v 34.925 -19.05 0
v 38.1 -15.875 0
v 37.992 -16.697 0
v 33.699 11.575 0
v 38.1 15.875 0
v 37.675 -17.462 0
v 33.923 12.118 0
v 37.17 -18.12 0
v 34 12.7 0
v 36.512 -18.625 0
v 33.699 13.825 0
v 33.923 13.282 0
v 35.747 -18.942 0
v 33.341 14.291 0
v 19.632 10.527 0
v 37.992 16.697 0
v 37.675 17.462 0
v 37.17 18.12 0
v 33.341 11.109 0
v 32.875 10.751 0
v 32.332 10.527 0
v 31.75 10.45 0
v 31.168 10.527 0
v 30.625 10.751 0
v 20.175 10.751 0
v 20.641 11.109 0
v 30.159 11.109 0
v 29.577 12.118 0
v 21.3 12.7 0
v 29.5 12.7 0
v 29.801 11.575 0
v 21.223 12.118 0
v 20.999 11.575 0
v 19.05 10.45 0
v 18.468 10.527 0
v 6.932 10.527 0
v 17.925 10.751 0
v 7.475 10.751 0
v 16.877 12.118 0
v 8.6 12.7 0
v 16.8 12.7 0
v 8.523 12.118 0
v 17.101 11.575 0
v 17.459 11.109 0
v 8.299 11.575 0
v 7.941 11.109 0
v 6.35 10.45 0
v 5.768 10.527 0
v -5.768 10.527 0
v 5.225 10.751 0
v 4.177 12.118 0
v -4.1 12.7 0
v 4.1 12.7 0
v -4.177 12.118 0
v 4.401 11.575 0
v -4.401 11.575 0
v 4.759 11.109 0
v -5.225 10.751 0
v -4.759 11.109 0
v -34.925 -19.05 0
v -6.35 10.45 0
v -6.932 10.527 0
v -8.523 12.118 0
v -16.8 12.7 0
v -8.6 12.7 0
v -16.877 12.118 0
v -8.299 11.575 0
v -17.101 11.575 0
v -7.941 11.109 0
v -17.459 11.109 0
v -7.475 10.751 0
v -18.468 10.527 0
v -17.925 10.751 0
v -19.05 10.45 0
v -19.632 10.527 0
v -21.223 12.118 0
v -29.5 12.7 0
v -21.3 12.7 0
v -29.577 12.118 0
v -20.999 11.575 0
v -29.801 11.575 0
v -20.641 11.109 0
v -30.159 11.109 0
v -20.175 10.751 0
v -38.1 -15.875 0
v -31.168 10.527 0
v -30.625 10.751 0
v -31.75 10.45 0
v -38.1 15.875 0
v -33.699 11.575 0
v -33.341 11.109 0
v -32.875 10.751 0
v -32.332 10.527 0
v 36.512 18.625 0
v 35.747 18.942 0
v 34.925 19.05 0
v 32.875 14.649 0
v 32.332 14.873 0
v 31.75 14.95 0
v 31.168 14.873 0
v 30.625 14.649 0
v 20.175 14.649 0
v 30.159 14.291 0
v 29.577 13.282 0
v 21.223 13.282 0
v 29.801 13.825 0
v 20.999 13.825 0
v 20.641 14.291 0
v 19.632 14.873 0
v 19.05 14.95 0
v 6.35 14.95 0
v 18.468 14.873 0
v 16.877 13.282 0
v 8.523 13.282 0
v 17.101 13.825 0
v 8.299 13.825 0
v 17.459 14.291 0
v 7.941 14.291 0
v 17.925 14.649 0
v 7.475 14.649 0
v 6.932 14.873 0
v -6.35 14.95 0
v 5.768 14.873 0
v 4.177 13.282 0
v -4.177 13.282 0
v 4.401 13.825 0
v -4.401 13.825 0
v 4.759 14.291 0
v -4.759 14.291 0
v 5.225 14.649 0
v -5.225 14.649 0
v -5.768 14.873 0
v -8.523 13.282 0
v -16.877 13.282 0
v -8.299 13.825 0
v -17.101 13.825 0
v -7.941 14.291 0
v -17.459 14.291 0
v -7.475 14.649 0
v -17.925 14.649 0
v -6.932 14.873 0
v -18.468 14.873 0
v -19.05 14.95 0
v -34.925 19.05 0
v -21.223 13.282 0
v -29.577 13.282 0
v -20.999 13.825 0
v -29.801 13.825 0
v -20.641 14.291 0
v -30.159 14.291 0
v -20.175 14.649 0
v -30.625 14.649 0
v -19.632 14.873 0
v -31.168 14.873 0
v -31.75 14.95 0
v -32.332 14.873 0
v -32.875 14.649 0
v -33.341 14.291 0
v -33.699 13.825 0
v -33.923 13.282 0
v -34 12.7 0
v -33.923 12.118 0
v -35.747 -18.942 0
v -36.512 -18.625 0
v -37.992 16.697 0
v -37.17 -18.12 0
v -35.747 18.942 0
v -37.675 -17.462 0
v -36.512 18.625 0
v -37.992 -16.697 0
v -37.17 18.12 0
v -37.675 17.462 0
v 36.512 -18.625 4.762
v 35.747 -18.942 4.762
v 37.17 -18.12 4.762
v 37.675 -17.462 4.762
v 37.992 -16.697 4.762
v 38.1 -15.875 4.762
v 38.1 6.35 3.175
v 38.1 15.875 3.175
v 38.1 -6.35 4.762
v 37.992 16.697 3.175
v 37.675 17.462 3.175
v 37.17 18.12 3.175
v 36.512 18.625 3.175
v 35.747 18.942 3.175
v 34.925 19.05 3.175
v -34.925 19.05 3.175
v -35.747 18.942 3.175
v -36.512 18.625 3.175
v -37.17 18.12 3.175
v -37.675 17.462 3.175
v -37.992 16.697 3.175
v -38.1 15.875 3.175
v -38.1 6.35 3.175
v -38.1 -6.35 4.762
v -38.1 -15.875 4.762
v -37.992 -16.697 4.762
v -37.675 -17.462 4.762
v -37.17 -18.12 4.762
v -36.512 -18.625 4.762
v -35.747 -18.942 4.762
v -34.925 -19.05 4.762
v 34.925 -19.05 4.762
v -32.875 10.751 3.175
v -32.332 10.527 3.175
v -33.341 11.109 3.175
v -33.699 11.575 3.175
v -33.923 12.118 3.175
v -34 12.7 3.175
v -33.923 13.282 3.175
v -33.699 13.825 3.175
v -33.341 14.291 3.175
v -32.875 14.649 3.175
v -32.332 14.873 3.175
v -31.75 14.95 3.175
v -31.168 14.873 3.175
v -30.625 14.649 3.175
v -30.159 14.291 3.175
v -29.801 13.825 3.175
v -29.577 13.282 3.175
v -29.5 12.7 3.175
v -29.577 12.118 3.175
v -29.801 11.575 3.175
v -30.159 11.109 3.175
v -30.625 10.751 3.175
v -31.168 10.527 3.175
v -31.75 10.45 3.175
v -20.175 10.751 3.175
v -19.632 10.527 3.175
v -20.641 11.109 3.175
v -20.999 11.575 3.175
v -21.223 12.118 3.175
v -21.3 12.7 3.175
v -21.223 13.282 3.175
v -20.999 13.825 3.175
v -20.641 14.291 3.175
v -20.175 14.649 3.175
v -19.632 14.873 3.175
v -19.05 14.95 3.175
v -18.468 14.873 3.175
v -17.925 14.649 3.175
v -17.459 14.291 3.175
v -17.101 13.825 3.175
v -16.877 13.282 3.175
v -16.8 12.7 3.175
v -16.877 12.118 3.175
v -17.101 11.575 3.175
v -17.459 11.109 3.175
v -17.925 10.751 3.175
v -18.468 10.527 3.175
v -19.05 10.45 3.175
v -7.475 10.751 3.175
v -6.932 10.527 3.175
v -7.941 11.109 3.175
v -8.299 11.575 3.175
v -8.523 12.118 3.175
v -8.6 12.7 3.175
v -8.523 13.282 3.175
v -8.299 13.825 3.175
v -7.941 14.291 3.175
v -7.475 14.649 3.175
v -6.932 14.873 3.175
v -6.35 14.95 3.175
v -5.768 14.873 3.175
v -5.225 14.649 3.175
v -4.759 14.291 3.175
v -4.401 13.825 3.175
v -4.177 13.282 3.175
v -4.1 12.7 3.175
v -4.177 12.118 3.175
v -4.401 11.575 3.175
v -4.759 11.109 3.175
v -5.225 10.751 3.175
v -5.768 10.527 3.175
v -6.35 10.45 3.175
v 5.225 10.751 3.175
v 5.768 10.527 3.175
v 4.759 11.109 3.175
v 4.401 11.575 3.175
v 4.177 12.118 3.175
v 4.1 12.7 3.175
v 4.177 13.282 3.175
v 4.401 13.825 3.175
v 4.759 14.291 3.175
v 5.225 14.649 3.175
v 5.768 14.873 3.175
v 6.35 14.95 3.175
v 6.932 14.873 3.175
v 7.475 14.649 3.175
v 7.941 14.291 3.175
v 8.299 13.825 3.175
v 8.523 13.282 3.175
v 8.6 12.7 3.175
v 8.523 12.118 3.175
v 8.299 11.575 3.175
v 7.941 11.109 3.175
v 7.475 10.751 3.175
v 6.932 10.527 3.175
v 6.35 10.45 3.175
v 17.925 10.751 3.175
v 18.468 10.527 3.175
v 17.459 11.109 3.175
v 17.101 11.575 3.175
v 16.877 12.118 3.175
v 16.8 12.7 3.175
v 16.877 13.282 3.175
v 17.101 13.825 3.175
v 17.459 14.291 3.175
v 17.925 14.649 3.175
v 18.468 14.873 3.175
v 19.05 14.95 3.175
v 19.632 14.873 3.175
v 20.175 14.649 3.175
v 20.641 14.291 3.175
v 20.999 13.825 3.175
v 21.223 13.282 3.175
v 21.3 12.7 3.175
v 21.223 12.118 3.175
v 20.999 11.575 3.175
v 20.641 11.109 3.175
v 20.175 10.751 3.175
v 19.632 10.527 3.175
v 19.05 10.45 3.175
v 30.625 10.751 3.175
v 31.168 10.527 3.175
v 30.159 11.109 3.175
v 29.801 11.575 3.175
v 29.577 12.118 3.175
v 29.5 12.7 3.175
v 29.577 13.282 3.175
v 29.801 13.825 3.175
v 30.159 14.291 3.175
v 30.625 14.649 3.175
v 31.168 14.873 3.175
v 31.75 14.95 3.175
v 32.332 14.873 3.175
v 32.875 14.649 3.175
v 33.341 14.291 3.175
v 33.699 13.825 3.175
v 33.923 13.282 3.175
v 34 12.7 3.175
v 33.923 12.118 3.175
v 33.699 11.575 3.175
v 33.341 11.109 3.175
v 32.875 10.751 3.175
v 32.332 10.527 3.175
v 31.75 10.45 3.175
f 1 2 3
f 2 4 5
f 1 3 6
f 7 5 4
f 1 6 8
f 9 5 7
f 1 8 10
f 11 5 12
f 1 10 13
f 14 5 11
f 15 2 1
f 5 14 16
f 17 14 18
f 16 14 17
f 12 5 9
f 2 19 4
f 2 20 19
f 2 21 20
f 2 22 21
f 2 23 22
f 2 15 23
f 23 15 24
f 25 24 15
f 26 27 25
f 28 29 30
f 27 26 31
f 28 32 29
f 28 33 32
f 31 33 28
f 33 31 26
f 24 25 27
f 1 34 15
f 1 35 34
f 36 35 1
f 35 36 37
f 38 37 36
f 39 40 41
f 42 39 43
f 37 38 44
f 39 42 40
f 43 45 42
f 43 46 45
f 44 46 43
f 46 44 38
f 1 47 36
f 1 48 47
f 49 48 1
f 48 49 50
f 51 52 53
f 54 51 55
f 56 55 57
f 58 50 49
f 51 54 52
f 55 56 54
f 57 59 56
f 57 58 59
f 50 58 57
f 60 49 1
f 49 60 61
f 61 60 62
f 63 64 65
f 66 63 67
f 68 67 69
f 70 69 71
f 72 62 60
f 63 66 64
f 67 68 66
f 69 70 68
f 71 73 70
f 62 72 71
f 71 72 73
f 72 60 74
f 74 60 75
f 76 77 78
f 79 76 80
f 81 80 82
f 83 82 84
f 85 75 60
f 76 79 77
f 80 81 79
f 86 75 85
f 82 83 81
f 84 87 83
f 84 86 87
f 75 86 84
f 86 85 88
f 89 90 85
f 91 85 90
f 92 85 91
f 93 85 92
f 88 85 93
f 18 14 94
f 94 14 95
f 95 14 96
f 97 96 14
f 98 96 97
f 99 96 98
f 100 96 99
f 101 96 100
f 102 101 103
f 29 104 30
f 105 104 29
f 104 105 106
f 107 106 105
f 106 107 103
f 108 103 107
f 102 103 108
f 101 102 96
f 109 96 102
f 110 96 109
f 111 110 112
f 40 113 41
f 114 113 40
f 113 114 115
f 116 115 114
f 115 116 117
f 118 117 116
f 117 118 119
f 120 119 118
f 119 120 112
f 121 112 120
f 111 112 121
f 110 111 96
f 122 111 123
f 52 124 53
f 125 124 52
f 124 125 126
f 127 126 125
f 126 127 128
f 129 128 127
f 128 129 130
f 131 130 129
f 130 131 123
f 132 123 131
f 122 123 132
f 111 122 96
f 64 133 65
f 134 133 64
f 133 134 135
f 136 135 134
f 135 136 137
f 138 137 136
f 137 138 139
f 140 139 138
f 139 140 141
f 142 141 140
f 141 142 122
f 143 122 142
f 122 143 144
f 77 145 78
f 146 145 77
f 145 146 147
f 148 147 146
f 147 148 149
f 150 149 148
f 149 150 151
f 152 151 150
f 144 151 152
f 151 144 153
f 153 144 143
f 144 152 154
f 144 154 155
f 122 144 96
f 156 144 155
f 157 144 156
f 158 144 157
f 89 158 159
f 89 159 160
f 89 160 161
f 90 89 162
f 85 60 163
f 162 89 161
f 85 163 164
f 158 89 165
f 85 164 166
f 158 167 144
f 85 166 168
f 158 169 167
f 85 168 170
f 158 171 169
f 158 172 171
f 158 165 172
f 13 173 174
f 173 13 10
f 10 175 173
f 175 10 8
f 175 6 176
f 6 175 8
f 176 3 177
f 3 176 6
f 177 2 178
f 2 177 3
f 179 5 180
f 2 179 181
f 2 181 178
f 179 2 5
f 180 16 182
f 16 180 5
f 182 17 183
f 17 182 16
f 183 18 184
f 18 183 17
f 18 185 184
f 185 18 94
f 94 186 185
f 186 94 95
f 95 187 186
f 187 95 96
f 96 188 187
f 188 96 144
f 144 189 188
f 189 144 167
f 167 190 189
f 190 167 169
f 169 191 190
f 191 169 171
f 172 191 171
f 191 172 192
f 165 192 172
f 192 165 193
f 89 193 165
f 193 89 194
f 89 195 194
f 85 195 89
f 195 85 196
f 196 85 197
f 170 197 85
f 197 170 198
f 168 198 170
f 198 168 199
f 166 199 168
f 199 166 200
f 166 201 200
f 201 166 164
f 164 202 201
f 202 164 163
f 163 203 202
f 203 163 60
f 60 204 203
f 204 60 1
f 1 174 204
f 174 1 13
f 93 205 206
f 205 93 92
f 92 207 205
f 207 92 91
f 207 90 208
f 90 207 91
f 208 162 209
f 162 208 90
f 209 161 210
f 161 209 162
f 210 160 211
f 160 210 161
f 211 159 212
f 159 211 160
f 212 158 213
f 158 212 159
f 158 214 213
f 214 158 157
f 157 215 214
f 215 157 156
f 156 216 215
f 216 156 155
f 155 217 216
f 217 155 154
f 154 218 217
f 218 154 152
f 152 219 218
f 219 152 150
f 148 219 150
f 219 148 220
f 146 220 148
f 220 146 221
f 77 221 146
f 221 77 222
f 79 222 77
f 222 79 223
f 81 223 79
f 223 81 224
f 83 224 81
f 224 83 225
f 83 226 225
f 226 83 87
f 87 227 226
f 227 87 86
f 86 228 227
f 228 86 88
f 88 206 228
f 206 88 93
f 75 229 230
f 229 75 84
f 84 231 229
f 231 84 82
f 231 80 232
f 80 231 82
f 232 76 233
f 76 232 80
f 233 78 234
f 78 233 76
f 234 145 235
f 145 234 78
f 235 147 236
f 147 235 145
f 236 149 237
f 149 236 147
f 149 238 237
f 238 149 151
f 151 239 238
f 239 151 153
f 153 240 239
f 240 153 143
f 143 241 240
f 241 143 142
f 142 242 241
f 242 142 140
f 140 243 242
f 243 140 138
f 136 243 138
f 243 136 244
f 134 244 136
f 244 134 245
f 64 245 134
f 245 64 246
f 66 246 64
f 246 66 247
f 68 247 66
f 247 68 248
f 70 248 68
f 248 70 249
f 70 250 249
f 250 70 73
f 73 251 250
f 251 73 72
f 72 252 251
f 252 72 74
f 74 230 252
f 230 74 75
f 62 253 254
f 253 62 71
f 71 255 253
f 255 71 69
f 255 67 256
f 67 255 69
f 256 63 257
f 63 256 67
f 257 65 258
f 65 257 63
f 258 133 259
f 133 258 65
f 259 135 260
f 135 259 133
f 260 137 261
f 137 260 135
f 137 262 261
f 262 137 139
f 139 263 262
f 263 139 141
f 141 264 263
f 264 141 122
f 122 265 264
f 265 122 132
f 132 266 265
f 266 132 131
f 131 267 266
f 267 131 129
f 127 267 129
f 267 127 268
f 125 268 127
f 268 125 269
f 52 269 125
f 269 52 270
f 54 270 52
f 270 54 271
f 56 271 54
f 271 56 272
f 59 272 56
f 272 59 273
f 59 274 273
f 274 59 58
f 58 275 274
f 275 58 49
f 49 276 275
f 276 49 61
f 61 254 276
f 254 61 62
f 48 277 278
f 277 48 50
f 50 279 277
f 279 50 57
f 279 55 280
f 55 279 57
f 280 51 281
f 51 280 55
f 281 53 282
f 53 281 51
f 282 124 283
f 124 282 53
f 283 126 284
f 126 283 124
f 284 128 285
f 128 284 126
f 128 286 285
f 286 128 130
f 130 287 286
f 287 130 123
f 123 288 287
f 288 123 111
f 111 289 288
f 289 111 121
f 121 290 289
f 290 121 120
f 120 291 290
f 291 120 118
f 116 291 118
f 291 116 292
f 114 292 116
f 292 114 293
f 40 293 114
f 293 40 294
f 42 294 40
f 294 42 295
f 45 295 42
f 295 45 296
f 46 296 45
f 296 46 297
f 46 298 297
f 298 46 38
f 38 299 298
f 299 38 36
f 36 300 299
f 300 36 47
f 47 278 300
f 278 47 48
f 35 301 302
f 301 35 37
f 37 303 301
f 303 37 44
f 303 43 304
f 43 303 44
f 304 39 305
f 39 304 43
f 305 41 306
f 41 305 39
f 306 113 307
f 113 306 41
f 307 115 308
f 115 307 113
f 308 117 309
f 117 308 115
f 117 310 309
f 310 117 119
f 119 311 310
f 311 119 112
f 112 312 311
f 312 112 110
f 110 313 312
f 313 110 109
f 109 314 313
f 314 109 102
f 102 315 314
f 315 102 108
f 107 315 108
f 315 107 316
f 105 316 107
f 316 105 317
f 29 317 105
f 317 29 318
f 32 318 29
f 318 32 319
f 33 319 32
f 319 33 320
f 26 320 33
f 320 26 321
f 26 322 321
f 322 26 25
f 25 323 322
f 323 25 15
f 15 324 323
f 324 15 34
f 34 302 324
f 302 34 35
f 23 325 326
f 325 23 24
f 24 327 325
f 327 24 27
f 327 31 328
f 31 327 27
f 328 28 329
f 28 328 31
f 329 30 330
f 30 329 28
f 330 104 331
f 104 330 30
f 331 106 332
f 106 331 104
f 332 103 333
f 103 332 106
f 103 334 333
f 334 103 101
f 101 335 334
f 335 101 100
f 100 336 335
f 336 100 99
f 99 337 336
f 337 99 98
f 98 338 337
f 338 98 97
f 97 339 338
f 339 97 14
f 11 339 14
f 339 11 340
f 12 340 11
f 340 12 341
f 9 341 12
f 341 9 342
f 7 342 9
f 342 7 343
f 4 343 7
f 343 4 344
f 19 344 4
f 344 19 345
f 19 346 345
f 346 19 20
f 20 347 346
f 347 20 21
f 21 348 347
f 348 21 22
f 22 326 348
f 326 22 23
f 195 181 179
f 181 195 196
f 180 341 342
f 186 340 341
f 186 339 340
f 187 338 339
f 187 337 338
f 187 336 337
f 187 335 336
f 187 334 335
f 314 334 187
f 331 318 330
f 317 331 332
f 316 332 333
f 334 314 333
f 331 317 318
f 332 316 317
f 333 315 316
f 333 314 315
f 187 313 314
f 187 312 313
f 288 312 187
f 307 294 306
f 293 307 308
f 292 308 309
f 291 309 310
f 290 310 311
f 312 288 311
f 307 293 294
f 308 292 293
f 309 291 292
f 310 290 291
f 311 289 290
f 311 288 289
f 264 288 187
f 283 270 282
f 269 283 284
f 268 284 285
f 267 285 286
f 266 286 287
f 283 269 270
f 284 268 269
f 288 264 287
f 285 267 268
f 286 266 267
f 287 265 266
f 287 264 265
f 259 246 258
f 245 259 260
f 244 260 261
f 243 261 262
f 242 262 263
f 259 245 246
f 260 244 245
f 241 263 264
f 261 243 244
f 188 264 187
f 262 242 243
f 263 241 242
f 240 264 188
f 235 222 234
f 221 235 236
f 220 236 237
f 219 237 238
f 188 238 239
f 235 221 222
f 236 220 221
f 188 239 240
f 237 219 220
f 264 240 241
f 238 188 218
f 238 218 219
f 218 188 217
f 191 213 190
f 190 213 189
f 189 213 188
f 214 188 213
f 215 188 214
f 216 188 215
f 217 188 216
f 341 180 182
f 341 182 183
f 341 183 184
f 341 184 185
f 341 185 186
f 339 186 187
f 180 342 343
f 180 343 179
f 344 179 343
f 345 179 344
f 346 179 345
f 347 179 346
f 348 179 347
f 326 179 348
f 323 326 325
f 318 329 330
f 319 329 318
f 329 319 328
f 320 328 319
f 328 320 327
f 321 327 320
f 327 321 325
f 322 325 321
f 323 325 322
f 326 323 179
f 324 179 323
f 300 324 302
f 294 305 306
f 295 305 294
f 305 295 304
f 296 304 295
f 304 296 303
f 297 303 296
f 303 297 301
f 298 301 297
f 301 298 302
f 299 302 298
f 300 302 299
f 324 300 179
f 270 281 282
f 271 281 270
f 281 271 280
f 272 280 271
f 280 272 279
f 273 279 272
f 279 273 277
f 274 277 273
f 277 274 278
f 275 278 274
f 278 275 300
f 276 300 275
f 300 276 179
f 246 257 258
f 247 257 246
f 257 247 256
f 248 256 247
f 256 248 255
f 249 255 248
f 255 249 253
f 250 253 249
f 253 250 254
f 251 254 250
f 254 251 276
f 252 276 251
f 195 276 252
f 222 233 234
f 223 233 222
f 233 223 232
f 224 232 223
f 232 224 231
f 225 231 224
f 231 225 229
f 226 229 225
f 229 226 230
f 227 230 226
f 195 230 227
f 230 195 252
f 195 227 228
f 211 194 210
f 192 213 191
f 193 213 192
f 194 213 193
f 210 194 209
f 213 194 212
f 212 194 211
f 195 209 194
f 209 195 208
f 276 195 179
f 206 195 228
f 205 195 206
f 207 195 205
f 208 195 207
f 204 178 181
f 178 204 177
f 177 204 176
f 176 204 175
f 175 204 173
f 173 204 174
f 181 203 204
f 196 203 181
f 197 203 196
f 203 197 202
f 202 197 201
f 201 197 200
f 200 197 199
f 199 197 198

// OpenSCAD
// file: ../lib/TOGArrayLib1.scad
// TOGArrayLib1.4
// 
// Functions for working with arrays.
// 
// v1.1:
// - tal1_reduce assert(is_list(items)) to prevent infinite recursion
//   when given undefined or other non-list values
// v1.1.1:
// - Fix tal1_uniq_remap_v2 to return "list-remap-result" as the
//   first element of the returned list
// v1.2:
// - Add tal1_replace_at function
// v1.3:
// - tal1_is_vec_of, tal1_is_vec_of_num
// v1.4:
// - tal1_assert_for_each, for when you want to assert something
//   about each of a list of items and get nice failure messages

/**
 * Make a list with the contents of list `a`,
 * but starting at offset `off`, replaced by the contents of list `b`.
 * len(result) = max(len(a), off+len(b))
 */
function tal1_replace_at(a, off, b, default_value=undef, default_value_function=undef) =
	assert(is_list(a))
	assert(is_list(b))
	let( _dvf = !is_undef(default_value_function) ? default_value_function : function(i) default_value )
[
	for( i=[0:1:min(off,len(a))-1] ) a[i],
	for( i=[len(a):1:off-1] ) _dvf(i),
	for( i=[off:1:off+len(b)-1] ) b[i-off],
	for( i=[off+len(b):1:len(a)-1] ) a[i],
];

// Simplest case
assert([] == tal1_replace_at([], 0, []));
// Second simplest cases
assert(["foo"] == tal1_replace_at(["foo"], 0, []));
assert(["foo"] == tal1_replace_at([], 0, ["foo"]));
// Replace one item
assert(["foo","quux","baz"] == tal1_replace_at(["foo","bar","baz"], 1, ["quux"]));
// Replace and extend
assert(["foo","quux","tuna","tina"] == tal1_replace_at(["foo","bar","baz"], 1, ["quux", "tuna", "tina"]));
// Add beyond end of `a`
assert(["foo","zzz","quux"] == tal1_replace_at(["foo"], 2, ["quux"], default_value="zzz"));
// Adding 'nothing' should still fill to that point with defaults
assert(["foo","zzz","zzz"] == tal1_replace_at(["foo"], 3, [], default_value="zzz"));


function tal1_reduce(start, items, func, offset=0) =
	assert(is_list(items))
	len(items) == offset ? start :
	tal1_reduce(func(start, items[offset]), items, func, offset+1);

function tal1_consecutive_duplicate_count(items) = tal1_reduce(
	[0, undef],
	items,
	function(z,item) [z[0] + (item == z[1] ? 1 : 0), item]
)[0];

assert(0 == tal1_consecutive_duplicate_count([]));
assert(0 == tal1_consecutive_duplicate_count([50]));
assert(1 == tal1_consecutive_duplicate_count([50,50]));
assert(0 == tal1_consecutive_duplicate_count([50,51,52,53]));
assert(1 == tal1_consecutive_duplicate_count([50,51,52,52]));
assert(3 == tal1_consecutive_duplicate_count([50,50,50,50]));

// Set test_size to arbirarily large values
// to ensure that OpenSCAD can handle heavy recursion
let(test_size=1000) assert(test_size/2 == tal1_consecutive_duplicate_count([for(i=[0:1:test_size-1]) floor(i/2)]));



function tal1_uniq_(items, off0, off1) =
	let(chunklen = off1-off0)
	chunklen == 0 ? [] :
	chunklen == 1 ? [items[off0]] :
	let(half=floor(chunklen/2))
	let(left  = tal1_uniq_(items, off0     , off0+half))
	let(right = tal1_uniq_(items, off0+half, off1     ))
	assert(len(left) > 0)
	assert(len(right) > 0)
	left[len(left)-1] == right[0] ? [each left, for(i=[1:1:len(right)-1]) right[i]] :
	[each left, each right];

/** Given a list of items, returns a new list with identical consecutive items merged */
function tal1_uniq(items) = tal1_uniq_(items, 0, len(items));

assert([] == tal1_uniq([]));
assert([123] == tal1_uniq([123]));
assert([55,0,1,2,3] == tal1_uniq([55,0,1,2,3]));
assert([55,0,1,2] == tal1_uniq([55,0,1,1,2]));
assert([55,0,1] == tal1_uniq([55,55,0,0,0,0,0,0,1,1,1,1]));
assert([55,0] == tal1_uniq([55,0,0,0,0,0,0,0]));



/**
 * Returns [new items, old index -> new index mapping].
 * No-op version.
 */
function tal1_uniq_remap_v1(items) =
	["list-remap-result", items, [for (vi=[0:1:len(items)-1]) vi]];

// [a, a, b, b, c, c]
//
// [a,    ...], []  -> [a],[0]
// [a, a, ...], [0] -> [a],[0,0]

assert([1,2,3] == [1,2,3]);

/**
 * Recursive version that will combine adjacent identical vertexes,
 * but will use the original items.
 */
function tal1_uniq_remap_v2(items, map=[]) =
	let(index = len(map))
	len(items) == index ? ["list-remap-result", items, map] :
	index == 0 ? tal1_uniq_remap_v2(items, [0]) :
	items[index] == items[map[index-1]] ? tal1_uniq_remap_v2(items, [for(vi=map) vi, map[index-1]]) :
	tal1_uniq_remap_v2(items, [for(vi=map) vi, index]);

assert(tal1_uniq_remap_v2([1,1,2,2,3,4]) == ["list-remap-result", [1,1,2,2,3,4], [0,0,2,2,4,5]]);


/**
 * Returns true if `vec` is a list of at least min_len items
 * and component_check(each item, even those beyond min_len) is true.
 */
function tal1_is_vec_of(vec, min_len=0, component_check=function(x) true) =
	assert(is_num(min_len) && min_len >= 0)
	assert(is_function(component_check))
	is_list(vec) && len(vec) >= min_len &&
	tal1_reduce(true, vec, function(prev,item) prev && component_check(item));

function tal1_is_vec_of_num(vec, min_len=0) = tal1_is_vec_of(vec, min_len, function(i) is_num(i));

assert( true == tal1_is_vec_of_num([1,2,3]));
assert( true == tal1_is_vec_of_num([]));
assert( true == tal1_is_vec_of_num([1,2,3], 3));
assert(false == tal1_is_vec_of_num([1,2], 3));
assert(false == tal1_is_vec_of_num([1,2,"spoon"], 3));
// Requirements are ambiguous when
// first min_len items are numbers, but there are non-numeric items afterwards,
// so let's error on the side of saying 'no, it's not a list of numbers';
// i.e. the item check and the min_len are independent.
assert(false == tal1_is_vec_of_num([1,2,3,"artichoke"], 3));


/**
 * Asserts that item_checker(each item in list, index of item)[0] is true.
 * Second element of item_checker return value is assertion message.
 * Returns the original list, in case that's useful to you.
 */
function tal1_assert_for_each(list, item_checker) =
	let( _ignored = [ for(i=[0:1:len(list)-1])
		let(q=item_checker(list[i],i))
		let(passed=is_bool(q) ? q : is_list(q) ? q[0] : assert(false, str(
			"tal1_assert_for_each: item_checker should return Bool|[Bool,String], but returned ",
			q, " for item at index ", i)))
		let(message=is_list(q) ? q[1] : undef)
		assert(passed, message)
		q
	])
	list;

// Callback can return a boolean...
assert([1,2,3] == tal1_assert_for_each([1,2,3], function(v,i) is_num(v)));
// ...or a [boolean, string]
assert([1,2,3] == tal1_assert_for_each([1,2,3], function(v,i) [is_num(v), "element be a num"]));
// file: ../lib/TOGMod1Constructors.scad
// TOGMod1Constructors-v1.6
// 
// Functions to construct objects understood by TOGMod1
// 
// v1.1:
// - Add togmod1_make_rounded_rect
// v1.2:
// - togmod1_make_rounded_rect can make ovals
// v1.3:
// - togmod1_circle_points, to just get the points of a circle
// - if pos parameter to circle function has a third element,
//   returned vertexes will include it as the z component;
// v1.3.1
// - Some assertions
// v1.4:
// - Refactor togmod1_rounded_rect_points and togmod1_circle_points
//   to use togmod1__make_nd_vector_adder for adapting to whatever
//   `pos` parameter is.
// v1.5:
// - togmod_rounded_rect_points will not simplify completely rounded sides
//   (where length of side is exactly twice the rounding radius)
//   unless simplify_rounded_sides=true
//   - This makes it more useful for polyhedron generation,
//     where radius varies, but number of points must remain constant.
// v1.6:
// - togmod1_make_rect makes a simple rectangle
// - togmod1_make_rounded_rect will defer to togmod1_make_rect when r=0

use <./TOGArrayLib1.scad>

function togmod1__make_nd_vector_adder(origin=[0,0]) =
	let(origin_is_zero = tal1_reduce(true, origin, function(prev,item) prev && item == 0))
	origin_is_zero ? (function(vec) len(vec) >= len(origin) ? vec : tal1_replace_at(origin, 0, vec)) :
	function(vec) [
		for(i=[0:1:max(len(origin),len(vec))-1]) (len(vec) > i ? vec[i] : 0) + (len(origin) > i ? origin[i] : 0),
	];

assert([1,2,3] == togmod1__make_nd_vector_adder()([1,2,3]));
echo(togmod1__make_nd_vector_adder([0,0,3])([1,2]));
assert([1,2,3] == togmod1__make_nd_vector_adder([0,0,3])([1,2]));


function togmod1_make_cuboid(size) =
	assert(is_list(size))
	assert(len(size) >= 3)
	assert(is_num(size[0]))
	assert(is_num(size[1]))
	assert(is_num(size[2]))
	["polyhedron-vf", [
		[-size[0]/2, -size[1]/2, -size[2]/2],
		[+size[0]/2, -size[1]/2, -size[2]/2],
		[-size[0]/2, +size[1]/2, -size[2]/2],
		[+size[0]/2, +size[1]/2, -size[2]/2],
		[-size[0]/2, -size[1]/2, +size[2]/2],
		[+size[0]/2, -size[1]/2, +size[2]/2],
		[-size[0]/2, +size[1]/2, +size[2]/2],
		[+size[0]/2, +size[1]/2, +size[2]/2]
	], [
		[0,1,3,2],[0,4,5,1],[4,6,7,5],[3,7,6,2],[1,5,7,3],[6,4,0,2]
	]];

function togmod1_make_polygon(verts) =
	["polygon-vp", verts, [[for( i=[0:1:len(verts)-1] ) i%len(verts)]]];

function togmod1_rounded_rect_points(size, r, pos=[0,0], simplify_rounded_sides=false) =
	assert(is_list(size))
	assert(len(size) >= 2)
	let(radii = is_list(r) ? r : is_num(r) ? [r,r] : assert(false, "rounded_rect r(adius) should be list<num> or num"))
	let(rx = radii[0])
	let(ry = radii[1])
	assert(is_num(rx))
	assert(is_num(ry))
	assert(size[0] >= 2*rx, str("size[0] must be >= 2*r[0]; size[0] = ",size[0],", 2*r[0] = ",2*rx))
	assert(size[1] >= 2*ry, str("size[1] must be >= 2*r[1]; size[1] = ",size[1],", 2*r[1] = ",2*ry))
	let(quarterfn=max($fn/4, 1))
	let(qfnx = simplify_rounded_sides && size[0] == 2*rx ? quarterfn-1 : quarterfn)
	let(qfny = simplify_rounded_sides && size[1] == 2*ry ? quarterfn-1 : quarterfn)
	let(finalizepos = togmod1__make_nd_vector_adder(pos))
[
	for(a=[0 : 1 : qfnx]) let(ang=      a*90/quarterfn) finalizepos([ size[0]/2-rx + rx*cos(ang),  size[1]/2-ry + ry*sin(ang)]),
	for(a=[0 : 1 : qfny]) let(ang= 90 + a*90/quarterfn) finalizepos([-size[0]/2+rx + rx*cos(ang),  size[1]/2-ry + ry*sin(ang)]),
	for(a=[0 : 1 : qfnx]) let(ang=180 + a*90/quarterfn) finalizepos([-size[0]/2+rx + rx*cos(ang), -size[1]/2+ry + ry*sin(ang)]),
	for(a=[0 : 1 : qfny]) let(ang=270 + a*90/quarterfn) finalizepos([ size[0]/2-rx + rx*cos(ang), -size[1]/2+ry + ry*sin(ang)]),
];

function togmod1_make_rect(size) =
	togmod1_make_polygon([
		[-size[0]/2, -size[1]/2],
		[+size[0]/2, -size[1]/2],
		[+size[0]/2, +size[1]/2],
		[-size[0]/2, +size[1]/2],
	]);

function togmod1_make_rounded_rect(size, r) =
	r == 0 ? togmod1_make_rect(size) :
	togmod1_make_polygon(togmod1_rounded_rect_points(size,r,simplify_rounded_sides=true));

function togmod1_circle_points(r, pos=[0,0], d=undef) =
	assert( !is_undef(r) || !is_undef(d) )
	assert(!is_undef(pos[0]))
	assert(!is_undef(pos[1]))
	let(finalizepos = togmod1__make_nd_vector_adder(pos))
	let(r_ = !is_undef(r) ? r : d/2)
	let(fn = max($fn, 6))
	[for(i=[0 : 1 : fn-1]) finalizepos([r_*cos(i*360/fn), r_*sin(i*360/fn)])];

function togmod1_make_circle(r, pos=[0,0], d=undef) =
	togmod1_make_polygon(togmod1_circle_points(r=r, pos=pos, d=d));

function togmod1_make_cylinder(d, zrange=[0,1], r=undef, pos=[0,0]) =
	assert( !is_undef(r) || !is_undef(d) )
	let( r_ = !is_undef(r) ? r : d/2 )
	// TODO: Make polyhedron directly
	["linear-extrude-zs", zrange, togmod1_make_circle(r=r_, pos=pos)];

function togmod1__is_range1d(range) = is_list(range) && len(range) == 2 && is_num(range[0]) && is_num(range[1]);

function togmod1_linear_extrude_z(range, shape) =
	assert(togmod1__is_range1d(range))
	["linear-extrude-zs", range, shape];
function togmod1_linear_extrude_x(range, shape) =
	assert(togmod1__is_range1d(range))
	["rotate", [90, 0, 90], togmod1_linear_extrude_z(range, shape)];
function togmod1_linear_extrude_y(range, shape) =
	assert(togmod1__is_range1d(range))
	["rotate", [90, 0, 180], togmod1_linear_extrude_z(range, shape)];
// file: ../lib/TOGMod1.scad
// TOGMod1
// OpenSCAD library for representing shapes
// 
// See also: Functional OpenSCAD (https://github.com/thehans/FunctionalOpenSCAD)

module togmod1_domodule(mod) {
	assert(is_list(mod));
	assert(len(mod) > 0);
	if( mod[0] == "polygon-vp" ) {
		// ["polygon-vp", vertexes, paths]
		polygon(points=mod[1], paths=mod[2]);
	} else if( mod[0] == "polyhedron-vf" ) {
		polyhedron(mod[1], faces=mod[2]);
	} else if( mod[0] == "scale" ) {
		assert(len(mod) == 3);
		scale(mod[1]) togmod1_domodule(mod[2]);
	} else if( mod[0] == "translate" ) {
		assert(len(mod) == 3);
		assert(is_list(mod[1]));
		for(c=mod[1]) assert(is_num(c), "translate component should be numeric");
		translate(mod[1]) togmod1_domodule(mod[2]);
	} else if( mod[0] == "rotate" ) {
		assert(len(mod) == 3);
		rotate(mod[1]) togmod1_domodule(mod[2]);
	} else if( mod[0] == "intersection" ) {
		intersection_for( i=[1:1:len(mod)-1] ) togmod1_domodule(mod[i]);
	} else if( mod[0] == "difference" ) {
		difference() {
			togmod1_domodule(mod[1]);
			for( i=[2:1:len(mod)-1] ) togmod1_domodule(mod[i]);
		}
	} else if( mod[0] == "union" ) {
		for( i=[1:1:len(mod)-1] ) togmod1_domodule(mod[i]);
	} else if( mod[0] == "hull" ) {
		hull() for( i=[1:1:len(mod)-1] ) togmod1_domodule(mod[i]);
	} else if( mod[0] == "offset-rs" ) {
		assert(len(mod) == 3);
		assert(is_num(mod[1]));
		assert(is_list(mod[2]));
		offset(mod[1]) togmod1_domodule(mod[2]);
	} else if( mod[0] == "linear-extrude-zs" ) {
		// ["linear-extrude-zs", [z0,z1], 2d_shape] // centered
		// ["linear-extrude-zs", height, 2d_shape]
		let( zrange = is_list(mod[1]) ? mod[1] : [-mod[1]/2, mod[1]/2] ) {
			translate([0,0,zrange[0]]) linear_extrude(zrange[1]-zrange[0]) togmod1_domodule(mod[2]);
		}
	} else if( mod[0] == "render" ) {
		render() togmod1_domodule(mod[1]);
	} else if( mod[0] == "minkowski" ) {
		minkowski() {
			togmod1_domodule(mod[1]);
			togmod1_domodule(mod[2]);
		}
	} else if( mod[0] == "x-debug" ) {
		# togmod1_domodule(mod[1]);
	} else {
		assert(false, str("Unrecognized shape: ", mod[0]));
	}
}
// main file
// GrippyPanel1.0
// 
// Panel for use with e.g. EdgeDrillJig1.

atom_pitch = 12.7;
size_atoms = [6, 3];
thickness0 = 3.175;
thickness1 = 4.7625;

use <../lib/TOGMod1.scad>
use <../lib/TOGMod1Constructors.scad>
use <../lib/TOGPolyhedronLib1.scad>

hull_2d = togmod1_make_rounded_rect(atom_pitch*[size_atoms[0], size_atoms[1]], r=3.175, $fn=24);
hole = togmod1_make_circle(d=4.5, $fn=24);

size = size_atoms * atom_pitch;

togmod1_domodule(["intersection",
	["linear-extrude-zs", [0, max(thickness0, thickness1)],
		["difference",
			hull_2d,
			
			for( xm=[-size_atoms[0]/2+0.5 : 1 : size_atoms[0]/2-0.4] )
			for( ym=[size_atoms[1]/2-0.5] )
			["translate", [xm*atom_pitch, ym*atom_pitch], hole],
		],
	],
	
	["rotate", [0,-90,0], ["linear-extrude-zs", [-size[0], size[0]], togmod1_make_polygon([
		[-1, -size[1]],
		[thickness1, -size[1]],
		[thickness1, -size[1]/2 + atom_pitch],
		[thickness0,  size[1]/2 - atom_pitch],
		[thickness0,  size[1]],
		[-1,  size[1]],
	])]],
]);
